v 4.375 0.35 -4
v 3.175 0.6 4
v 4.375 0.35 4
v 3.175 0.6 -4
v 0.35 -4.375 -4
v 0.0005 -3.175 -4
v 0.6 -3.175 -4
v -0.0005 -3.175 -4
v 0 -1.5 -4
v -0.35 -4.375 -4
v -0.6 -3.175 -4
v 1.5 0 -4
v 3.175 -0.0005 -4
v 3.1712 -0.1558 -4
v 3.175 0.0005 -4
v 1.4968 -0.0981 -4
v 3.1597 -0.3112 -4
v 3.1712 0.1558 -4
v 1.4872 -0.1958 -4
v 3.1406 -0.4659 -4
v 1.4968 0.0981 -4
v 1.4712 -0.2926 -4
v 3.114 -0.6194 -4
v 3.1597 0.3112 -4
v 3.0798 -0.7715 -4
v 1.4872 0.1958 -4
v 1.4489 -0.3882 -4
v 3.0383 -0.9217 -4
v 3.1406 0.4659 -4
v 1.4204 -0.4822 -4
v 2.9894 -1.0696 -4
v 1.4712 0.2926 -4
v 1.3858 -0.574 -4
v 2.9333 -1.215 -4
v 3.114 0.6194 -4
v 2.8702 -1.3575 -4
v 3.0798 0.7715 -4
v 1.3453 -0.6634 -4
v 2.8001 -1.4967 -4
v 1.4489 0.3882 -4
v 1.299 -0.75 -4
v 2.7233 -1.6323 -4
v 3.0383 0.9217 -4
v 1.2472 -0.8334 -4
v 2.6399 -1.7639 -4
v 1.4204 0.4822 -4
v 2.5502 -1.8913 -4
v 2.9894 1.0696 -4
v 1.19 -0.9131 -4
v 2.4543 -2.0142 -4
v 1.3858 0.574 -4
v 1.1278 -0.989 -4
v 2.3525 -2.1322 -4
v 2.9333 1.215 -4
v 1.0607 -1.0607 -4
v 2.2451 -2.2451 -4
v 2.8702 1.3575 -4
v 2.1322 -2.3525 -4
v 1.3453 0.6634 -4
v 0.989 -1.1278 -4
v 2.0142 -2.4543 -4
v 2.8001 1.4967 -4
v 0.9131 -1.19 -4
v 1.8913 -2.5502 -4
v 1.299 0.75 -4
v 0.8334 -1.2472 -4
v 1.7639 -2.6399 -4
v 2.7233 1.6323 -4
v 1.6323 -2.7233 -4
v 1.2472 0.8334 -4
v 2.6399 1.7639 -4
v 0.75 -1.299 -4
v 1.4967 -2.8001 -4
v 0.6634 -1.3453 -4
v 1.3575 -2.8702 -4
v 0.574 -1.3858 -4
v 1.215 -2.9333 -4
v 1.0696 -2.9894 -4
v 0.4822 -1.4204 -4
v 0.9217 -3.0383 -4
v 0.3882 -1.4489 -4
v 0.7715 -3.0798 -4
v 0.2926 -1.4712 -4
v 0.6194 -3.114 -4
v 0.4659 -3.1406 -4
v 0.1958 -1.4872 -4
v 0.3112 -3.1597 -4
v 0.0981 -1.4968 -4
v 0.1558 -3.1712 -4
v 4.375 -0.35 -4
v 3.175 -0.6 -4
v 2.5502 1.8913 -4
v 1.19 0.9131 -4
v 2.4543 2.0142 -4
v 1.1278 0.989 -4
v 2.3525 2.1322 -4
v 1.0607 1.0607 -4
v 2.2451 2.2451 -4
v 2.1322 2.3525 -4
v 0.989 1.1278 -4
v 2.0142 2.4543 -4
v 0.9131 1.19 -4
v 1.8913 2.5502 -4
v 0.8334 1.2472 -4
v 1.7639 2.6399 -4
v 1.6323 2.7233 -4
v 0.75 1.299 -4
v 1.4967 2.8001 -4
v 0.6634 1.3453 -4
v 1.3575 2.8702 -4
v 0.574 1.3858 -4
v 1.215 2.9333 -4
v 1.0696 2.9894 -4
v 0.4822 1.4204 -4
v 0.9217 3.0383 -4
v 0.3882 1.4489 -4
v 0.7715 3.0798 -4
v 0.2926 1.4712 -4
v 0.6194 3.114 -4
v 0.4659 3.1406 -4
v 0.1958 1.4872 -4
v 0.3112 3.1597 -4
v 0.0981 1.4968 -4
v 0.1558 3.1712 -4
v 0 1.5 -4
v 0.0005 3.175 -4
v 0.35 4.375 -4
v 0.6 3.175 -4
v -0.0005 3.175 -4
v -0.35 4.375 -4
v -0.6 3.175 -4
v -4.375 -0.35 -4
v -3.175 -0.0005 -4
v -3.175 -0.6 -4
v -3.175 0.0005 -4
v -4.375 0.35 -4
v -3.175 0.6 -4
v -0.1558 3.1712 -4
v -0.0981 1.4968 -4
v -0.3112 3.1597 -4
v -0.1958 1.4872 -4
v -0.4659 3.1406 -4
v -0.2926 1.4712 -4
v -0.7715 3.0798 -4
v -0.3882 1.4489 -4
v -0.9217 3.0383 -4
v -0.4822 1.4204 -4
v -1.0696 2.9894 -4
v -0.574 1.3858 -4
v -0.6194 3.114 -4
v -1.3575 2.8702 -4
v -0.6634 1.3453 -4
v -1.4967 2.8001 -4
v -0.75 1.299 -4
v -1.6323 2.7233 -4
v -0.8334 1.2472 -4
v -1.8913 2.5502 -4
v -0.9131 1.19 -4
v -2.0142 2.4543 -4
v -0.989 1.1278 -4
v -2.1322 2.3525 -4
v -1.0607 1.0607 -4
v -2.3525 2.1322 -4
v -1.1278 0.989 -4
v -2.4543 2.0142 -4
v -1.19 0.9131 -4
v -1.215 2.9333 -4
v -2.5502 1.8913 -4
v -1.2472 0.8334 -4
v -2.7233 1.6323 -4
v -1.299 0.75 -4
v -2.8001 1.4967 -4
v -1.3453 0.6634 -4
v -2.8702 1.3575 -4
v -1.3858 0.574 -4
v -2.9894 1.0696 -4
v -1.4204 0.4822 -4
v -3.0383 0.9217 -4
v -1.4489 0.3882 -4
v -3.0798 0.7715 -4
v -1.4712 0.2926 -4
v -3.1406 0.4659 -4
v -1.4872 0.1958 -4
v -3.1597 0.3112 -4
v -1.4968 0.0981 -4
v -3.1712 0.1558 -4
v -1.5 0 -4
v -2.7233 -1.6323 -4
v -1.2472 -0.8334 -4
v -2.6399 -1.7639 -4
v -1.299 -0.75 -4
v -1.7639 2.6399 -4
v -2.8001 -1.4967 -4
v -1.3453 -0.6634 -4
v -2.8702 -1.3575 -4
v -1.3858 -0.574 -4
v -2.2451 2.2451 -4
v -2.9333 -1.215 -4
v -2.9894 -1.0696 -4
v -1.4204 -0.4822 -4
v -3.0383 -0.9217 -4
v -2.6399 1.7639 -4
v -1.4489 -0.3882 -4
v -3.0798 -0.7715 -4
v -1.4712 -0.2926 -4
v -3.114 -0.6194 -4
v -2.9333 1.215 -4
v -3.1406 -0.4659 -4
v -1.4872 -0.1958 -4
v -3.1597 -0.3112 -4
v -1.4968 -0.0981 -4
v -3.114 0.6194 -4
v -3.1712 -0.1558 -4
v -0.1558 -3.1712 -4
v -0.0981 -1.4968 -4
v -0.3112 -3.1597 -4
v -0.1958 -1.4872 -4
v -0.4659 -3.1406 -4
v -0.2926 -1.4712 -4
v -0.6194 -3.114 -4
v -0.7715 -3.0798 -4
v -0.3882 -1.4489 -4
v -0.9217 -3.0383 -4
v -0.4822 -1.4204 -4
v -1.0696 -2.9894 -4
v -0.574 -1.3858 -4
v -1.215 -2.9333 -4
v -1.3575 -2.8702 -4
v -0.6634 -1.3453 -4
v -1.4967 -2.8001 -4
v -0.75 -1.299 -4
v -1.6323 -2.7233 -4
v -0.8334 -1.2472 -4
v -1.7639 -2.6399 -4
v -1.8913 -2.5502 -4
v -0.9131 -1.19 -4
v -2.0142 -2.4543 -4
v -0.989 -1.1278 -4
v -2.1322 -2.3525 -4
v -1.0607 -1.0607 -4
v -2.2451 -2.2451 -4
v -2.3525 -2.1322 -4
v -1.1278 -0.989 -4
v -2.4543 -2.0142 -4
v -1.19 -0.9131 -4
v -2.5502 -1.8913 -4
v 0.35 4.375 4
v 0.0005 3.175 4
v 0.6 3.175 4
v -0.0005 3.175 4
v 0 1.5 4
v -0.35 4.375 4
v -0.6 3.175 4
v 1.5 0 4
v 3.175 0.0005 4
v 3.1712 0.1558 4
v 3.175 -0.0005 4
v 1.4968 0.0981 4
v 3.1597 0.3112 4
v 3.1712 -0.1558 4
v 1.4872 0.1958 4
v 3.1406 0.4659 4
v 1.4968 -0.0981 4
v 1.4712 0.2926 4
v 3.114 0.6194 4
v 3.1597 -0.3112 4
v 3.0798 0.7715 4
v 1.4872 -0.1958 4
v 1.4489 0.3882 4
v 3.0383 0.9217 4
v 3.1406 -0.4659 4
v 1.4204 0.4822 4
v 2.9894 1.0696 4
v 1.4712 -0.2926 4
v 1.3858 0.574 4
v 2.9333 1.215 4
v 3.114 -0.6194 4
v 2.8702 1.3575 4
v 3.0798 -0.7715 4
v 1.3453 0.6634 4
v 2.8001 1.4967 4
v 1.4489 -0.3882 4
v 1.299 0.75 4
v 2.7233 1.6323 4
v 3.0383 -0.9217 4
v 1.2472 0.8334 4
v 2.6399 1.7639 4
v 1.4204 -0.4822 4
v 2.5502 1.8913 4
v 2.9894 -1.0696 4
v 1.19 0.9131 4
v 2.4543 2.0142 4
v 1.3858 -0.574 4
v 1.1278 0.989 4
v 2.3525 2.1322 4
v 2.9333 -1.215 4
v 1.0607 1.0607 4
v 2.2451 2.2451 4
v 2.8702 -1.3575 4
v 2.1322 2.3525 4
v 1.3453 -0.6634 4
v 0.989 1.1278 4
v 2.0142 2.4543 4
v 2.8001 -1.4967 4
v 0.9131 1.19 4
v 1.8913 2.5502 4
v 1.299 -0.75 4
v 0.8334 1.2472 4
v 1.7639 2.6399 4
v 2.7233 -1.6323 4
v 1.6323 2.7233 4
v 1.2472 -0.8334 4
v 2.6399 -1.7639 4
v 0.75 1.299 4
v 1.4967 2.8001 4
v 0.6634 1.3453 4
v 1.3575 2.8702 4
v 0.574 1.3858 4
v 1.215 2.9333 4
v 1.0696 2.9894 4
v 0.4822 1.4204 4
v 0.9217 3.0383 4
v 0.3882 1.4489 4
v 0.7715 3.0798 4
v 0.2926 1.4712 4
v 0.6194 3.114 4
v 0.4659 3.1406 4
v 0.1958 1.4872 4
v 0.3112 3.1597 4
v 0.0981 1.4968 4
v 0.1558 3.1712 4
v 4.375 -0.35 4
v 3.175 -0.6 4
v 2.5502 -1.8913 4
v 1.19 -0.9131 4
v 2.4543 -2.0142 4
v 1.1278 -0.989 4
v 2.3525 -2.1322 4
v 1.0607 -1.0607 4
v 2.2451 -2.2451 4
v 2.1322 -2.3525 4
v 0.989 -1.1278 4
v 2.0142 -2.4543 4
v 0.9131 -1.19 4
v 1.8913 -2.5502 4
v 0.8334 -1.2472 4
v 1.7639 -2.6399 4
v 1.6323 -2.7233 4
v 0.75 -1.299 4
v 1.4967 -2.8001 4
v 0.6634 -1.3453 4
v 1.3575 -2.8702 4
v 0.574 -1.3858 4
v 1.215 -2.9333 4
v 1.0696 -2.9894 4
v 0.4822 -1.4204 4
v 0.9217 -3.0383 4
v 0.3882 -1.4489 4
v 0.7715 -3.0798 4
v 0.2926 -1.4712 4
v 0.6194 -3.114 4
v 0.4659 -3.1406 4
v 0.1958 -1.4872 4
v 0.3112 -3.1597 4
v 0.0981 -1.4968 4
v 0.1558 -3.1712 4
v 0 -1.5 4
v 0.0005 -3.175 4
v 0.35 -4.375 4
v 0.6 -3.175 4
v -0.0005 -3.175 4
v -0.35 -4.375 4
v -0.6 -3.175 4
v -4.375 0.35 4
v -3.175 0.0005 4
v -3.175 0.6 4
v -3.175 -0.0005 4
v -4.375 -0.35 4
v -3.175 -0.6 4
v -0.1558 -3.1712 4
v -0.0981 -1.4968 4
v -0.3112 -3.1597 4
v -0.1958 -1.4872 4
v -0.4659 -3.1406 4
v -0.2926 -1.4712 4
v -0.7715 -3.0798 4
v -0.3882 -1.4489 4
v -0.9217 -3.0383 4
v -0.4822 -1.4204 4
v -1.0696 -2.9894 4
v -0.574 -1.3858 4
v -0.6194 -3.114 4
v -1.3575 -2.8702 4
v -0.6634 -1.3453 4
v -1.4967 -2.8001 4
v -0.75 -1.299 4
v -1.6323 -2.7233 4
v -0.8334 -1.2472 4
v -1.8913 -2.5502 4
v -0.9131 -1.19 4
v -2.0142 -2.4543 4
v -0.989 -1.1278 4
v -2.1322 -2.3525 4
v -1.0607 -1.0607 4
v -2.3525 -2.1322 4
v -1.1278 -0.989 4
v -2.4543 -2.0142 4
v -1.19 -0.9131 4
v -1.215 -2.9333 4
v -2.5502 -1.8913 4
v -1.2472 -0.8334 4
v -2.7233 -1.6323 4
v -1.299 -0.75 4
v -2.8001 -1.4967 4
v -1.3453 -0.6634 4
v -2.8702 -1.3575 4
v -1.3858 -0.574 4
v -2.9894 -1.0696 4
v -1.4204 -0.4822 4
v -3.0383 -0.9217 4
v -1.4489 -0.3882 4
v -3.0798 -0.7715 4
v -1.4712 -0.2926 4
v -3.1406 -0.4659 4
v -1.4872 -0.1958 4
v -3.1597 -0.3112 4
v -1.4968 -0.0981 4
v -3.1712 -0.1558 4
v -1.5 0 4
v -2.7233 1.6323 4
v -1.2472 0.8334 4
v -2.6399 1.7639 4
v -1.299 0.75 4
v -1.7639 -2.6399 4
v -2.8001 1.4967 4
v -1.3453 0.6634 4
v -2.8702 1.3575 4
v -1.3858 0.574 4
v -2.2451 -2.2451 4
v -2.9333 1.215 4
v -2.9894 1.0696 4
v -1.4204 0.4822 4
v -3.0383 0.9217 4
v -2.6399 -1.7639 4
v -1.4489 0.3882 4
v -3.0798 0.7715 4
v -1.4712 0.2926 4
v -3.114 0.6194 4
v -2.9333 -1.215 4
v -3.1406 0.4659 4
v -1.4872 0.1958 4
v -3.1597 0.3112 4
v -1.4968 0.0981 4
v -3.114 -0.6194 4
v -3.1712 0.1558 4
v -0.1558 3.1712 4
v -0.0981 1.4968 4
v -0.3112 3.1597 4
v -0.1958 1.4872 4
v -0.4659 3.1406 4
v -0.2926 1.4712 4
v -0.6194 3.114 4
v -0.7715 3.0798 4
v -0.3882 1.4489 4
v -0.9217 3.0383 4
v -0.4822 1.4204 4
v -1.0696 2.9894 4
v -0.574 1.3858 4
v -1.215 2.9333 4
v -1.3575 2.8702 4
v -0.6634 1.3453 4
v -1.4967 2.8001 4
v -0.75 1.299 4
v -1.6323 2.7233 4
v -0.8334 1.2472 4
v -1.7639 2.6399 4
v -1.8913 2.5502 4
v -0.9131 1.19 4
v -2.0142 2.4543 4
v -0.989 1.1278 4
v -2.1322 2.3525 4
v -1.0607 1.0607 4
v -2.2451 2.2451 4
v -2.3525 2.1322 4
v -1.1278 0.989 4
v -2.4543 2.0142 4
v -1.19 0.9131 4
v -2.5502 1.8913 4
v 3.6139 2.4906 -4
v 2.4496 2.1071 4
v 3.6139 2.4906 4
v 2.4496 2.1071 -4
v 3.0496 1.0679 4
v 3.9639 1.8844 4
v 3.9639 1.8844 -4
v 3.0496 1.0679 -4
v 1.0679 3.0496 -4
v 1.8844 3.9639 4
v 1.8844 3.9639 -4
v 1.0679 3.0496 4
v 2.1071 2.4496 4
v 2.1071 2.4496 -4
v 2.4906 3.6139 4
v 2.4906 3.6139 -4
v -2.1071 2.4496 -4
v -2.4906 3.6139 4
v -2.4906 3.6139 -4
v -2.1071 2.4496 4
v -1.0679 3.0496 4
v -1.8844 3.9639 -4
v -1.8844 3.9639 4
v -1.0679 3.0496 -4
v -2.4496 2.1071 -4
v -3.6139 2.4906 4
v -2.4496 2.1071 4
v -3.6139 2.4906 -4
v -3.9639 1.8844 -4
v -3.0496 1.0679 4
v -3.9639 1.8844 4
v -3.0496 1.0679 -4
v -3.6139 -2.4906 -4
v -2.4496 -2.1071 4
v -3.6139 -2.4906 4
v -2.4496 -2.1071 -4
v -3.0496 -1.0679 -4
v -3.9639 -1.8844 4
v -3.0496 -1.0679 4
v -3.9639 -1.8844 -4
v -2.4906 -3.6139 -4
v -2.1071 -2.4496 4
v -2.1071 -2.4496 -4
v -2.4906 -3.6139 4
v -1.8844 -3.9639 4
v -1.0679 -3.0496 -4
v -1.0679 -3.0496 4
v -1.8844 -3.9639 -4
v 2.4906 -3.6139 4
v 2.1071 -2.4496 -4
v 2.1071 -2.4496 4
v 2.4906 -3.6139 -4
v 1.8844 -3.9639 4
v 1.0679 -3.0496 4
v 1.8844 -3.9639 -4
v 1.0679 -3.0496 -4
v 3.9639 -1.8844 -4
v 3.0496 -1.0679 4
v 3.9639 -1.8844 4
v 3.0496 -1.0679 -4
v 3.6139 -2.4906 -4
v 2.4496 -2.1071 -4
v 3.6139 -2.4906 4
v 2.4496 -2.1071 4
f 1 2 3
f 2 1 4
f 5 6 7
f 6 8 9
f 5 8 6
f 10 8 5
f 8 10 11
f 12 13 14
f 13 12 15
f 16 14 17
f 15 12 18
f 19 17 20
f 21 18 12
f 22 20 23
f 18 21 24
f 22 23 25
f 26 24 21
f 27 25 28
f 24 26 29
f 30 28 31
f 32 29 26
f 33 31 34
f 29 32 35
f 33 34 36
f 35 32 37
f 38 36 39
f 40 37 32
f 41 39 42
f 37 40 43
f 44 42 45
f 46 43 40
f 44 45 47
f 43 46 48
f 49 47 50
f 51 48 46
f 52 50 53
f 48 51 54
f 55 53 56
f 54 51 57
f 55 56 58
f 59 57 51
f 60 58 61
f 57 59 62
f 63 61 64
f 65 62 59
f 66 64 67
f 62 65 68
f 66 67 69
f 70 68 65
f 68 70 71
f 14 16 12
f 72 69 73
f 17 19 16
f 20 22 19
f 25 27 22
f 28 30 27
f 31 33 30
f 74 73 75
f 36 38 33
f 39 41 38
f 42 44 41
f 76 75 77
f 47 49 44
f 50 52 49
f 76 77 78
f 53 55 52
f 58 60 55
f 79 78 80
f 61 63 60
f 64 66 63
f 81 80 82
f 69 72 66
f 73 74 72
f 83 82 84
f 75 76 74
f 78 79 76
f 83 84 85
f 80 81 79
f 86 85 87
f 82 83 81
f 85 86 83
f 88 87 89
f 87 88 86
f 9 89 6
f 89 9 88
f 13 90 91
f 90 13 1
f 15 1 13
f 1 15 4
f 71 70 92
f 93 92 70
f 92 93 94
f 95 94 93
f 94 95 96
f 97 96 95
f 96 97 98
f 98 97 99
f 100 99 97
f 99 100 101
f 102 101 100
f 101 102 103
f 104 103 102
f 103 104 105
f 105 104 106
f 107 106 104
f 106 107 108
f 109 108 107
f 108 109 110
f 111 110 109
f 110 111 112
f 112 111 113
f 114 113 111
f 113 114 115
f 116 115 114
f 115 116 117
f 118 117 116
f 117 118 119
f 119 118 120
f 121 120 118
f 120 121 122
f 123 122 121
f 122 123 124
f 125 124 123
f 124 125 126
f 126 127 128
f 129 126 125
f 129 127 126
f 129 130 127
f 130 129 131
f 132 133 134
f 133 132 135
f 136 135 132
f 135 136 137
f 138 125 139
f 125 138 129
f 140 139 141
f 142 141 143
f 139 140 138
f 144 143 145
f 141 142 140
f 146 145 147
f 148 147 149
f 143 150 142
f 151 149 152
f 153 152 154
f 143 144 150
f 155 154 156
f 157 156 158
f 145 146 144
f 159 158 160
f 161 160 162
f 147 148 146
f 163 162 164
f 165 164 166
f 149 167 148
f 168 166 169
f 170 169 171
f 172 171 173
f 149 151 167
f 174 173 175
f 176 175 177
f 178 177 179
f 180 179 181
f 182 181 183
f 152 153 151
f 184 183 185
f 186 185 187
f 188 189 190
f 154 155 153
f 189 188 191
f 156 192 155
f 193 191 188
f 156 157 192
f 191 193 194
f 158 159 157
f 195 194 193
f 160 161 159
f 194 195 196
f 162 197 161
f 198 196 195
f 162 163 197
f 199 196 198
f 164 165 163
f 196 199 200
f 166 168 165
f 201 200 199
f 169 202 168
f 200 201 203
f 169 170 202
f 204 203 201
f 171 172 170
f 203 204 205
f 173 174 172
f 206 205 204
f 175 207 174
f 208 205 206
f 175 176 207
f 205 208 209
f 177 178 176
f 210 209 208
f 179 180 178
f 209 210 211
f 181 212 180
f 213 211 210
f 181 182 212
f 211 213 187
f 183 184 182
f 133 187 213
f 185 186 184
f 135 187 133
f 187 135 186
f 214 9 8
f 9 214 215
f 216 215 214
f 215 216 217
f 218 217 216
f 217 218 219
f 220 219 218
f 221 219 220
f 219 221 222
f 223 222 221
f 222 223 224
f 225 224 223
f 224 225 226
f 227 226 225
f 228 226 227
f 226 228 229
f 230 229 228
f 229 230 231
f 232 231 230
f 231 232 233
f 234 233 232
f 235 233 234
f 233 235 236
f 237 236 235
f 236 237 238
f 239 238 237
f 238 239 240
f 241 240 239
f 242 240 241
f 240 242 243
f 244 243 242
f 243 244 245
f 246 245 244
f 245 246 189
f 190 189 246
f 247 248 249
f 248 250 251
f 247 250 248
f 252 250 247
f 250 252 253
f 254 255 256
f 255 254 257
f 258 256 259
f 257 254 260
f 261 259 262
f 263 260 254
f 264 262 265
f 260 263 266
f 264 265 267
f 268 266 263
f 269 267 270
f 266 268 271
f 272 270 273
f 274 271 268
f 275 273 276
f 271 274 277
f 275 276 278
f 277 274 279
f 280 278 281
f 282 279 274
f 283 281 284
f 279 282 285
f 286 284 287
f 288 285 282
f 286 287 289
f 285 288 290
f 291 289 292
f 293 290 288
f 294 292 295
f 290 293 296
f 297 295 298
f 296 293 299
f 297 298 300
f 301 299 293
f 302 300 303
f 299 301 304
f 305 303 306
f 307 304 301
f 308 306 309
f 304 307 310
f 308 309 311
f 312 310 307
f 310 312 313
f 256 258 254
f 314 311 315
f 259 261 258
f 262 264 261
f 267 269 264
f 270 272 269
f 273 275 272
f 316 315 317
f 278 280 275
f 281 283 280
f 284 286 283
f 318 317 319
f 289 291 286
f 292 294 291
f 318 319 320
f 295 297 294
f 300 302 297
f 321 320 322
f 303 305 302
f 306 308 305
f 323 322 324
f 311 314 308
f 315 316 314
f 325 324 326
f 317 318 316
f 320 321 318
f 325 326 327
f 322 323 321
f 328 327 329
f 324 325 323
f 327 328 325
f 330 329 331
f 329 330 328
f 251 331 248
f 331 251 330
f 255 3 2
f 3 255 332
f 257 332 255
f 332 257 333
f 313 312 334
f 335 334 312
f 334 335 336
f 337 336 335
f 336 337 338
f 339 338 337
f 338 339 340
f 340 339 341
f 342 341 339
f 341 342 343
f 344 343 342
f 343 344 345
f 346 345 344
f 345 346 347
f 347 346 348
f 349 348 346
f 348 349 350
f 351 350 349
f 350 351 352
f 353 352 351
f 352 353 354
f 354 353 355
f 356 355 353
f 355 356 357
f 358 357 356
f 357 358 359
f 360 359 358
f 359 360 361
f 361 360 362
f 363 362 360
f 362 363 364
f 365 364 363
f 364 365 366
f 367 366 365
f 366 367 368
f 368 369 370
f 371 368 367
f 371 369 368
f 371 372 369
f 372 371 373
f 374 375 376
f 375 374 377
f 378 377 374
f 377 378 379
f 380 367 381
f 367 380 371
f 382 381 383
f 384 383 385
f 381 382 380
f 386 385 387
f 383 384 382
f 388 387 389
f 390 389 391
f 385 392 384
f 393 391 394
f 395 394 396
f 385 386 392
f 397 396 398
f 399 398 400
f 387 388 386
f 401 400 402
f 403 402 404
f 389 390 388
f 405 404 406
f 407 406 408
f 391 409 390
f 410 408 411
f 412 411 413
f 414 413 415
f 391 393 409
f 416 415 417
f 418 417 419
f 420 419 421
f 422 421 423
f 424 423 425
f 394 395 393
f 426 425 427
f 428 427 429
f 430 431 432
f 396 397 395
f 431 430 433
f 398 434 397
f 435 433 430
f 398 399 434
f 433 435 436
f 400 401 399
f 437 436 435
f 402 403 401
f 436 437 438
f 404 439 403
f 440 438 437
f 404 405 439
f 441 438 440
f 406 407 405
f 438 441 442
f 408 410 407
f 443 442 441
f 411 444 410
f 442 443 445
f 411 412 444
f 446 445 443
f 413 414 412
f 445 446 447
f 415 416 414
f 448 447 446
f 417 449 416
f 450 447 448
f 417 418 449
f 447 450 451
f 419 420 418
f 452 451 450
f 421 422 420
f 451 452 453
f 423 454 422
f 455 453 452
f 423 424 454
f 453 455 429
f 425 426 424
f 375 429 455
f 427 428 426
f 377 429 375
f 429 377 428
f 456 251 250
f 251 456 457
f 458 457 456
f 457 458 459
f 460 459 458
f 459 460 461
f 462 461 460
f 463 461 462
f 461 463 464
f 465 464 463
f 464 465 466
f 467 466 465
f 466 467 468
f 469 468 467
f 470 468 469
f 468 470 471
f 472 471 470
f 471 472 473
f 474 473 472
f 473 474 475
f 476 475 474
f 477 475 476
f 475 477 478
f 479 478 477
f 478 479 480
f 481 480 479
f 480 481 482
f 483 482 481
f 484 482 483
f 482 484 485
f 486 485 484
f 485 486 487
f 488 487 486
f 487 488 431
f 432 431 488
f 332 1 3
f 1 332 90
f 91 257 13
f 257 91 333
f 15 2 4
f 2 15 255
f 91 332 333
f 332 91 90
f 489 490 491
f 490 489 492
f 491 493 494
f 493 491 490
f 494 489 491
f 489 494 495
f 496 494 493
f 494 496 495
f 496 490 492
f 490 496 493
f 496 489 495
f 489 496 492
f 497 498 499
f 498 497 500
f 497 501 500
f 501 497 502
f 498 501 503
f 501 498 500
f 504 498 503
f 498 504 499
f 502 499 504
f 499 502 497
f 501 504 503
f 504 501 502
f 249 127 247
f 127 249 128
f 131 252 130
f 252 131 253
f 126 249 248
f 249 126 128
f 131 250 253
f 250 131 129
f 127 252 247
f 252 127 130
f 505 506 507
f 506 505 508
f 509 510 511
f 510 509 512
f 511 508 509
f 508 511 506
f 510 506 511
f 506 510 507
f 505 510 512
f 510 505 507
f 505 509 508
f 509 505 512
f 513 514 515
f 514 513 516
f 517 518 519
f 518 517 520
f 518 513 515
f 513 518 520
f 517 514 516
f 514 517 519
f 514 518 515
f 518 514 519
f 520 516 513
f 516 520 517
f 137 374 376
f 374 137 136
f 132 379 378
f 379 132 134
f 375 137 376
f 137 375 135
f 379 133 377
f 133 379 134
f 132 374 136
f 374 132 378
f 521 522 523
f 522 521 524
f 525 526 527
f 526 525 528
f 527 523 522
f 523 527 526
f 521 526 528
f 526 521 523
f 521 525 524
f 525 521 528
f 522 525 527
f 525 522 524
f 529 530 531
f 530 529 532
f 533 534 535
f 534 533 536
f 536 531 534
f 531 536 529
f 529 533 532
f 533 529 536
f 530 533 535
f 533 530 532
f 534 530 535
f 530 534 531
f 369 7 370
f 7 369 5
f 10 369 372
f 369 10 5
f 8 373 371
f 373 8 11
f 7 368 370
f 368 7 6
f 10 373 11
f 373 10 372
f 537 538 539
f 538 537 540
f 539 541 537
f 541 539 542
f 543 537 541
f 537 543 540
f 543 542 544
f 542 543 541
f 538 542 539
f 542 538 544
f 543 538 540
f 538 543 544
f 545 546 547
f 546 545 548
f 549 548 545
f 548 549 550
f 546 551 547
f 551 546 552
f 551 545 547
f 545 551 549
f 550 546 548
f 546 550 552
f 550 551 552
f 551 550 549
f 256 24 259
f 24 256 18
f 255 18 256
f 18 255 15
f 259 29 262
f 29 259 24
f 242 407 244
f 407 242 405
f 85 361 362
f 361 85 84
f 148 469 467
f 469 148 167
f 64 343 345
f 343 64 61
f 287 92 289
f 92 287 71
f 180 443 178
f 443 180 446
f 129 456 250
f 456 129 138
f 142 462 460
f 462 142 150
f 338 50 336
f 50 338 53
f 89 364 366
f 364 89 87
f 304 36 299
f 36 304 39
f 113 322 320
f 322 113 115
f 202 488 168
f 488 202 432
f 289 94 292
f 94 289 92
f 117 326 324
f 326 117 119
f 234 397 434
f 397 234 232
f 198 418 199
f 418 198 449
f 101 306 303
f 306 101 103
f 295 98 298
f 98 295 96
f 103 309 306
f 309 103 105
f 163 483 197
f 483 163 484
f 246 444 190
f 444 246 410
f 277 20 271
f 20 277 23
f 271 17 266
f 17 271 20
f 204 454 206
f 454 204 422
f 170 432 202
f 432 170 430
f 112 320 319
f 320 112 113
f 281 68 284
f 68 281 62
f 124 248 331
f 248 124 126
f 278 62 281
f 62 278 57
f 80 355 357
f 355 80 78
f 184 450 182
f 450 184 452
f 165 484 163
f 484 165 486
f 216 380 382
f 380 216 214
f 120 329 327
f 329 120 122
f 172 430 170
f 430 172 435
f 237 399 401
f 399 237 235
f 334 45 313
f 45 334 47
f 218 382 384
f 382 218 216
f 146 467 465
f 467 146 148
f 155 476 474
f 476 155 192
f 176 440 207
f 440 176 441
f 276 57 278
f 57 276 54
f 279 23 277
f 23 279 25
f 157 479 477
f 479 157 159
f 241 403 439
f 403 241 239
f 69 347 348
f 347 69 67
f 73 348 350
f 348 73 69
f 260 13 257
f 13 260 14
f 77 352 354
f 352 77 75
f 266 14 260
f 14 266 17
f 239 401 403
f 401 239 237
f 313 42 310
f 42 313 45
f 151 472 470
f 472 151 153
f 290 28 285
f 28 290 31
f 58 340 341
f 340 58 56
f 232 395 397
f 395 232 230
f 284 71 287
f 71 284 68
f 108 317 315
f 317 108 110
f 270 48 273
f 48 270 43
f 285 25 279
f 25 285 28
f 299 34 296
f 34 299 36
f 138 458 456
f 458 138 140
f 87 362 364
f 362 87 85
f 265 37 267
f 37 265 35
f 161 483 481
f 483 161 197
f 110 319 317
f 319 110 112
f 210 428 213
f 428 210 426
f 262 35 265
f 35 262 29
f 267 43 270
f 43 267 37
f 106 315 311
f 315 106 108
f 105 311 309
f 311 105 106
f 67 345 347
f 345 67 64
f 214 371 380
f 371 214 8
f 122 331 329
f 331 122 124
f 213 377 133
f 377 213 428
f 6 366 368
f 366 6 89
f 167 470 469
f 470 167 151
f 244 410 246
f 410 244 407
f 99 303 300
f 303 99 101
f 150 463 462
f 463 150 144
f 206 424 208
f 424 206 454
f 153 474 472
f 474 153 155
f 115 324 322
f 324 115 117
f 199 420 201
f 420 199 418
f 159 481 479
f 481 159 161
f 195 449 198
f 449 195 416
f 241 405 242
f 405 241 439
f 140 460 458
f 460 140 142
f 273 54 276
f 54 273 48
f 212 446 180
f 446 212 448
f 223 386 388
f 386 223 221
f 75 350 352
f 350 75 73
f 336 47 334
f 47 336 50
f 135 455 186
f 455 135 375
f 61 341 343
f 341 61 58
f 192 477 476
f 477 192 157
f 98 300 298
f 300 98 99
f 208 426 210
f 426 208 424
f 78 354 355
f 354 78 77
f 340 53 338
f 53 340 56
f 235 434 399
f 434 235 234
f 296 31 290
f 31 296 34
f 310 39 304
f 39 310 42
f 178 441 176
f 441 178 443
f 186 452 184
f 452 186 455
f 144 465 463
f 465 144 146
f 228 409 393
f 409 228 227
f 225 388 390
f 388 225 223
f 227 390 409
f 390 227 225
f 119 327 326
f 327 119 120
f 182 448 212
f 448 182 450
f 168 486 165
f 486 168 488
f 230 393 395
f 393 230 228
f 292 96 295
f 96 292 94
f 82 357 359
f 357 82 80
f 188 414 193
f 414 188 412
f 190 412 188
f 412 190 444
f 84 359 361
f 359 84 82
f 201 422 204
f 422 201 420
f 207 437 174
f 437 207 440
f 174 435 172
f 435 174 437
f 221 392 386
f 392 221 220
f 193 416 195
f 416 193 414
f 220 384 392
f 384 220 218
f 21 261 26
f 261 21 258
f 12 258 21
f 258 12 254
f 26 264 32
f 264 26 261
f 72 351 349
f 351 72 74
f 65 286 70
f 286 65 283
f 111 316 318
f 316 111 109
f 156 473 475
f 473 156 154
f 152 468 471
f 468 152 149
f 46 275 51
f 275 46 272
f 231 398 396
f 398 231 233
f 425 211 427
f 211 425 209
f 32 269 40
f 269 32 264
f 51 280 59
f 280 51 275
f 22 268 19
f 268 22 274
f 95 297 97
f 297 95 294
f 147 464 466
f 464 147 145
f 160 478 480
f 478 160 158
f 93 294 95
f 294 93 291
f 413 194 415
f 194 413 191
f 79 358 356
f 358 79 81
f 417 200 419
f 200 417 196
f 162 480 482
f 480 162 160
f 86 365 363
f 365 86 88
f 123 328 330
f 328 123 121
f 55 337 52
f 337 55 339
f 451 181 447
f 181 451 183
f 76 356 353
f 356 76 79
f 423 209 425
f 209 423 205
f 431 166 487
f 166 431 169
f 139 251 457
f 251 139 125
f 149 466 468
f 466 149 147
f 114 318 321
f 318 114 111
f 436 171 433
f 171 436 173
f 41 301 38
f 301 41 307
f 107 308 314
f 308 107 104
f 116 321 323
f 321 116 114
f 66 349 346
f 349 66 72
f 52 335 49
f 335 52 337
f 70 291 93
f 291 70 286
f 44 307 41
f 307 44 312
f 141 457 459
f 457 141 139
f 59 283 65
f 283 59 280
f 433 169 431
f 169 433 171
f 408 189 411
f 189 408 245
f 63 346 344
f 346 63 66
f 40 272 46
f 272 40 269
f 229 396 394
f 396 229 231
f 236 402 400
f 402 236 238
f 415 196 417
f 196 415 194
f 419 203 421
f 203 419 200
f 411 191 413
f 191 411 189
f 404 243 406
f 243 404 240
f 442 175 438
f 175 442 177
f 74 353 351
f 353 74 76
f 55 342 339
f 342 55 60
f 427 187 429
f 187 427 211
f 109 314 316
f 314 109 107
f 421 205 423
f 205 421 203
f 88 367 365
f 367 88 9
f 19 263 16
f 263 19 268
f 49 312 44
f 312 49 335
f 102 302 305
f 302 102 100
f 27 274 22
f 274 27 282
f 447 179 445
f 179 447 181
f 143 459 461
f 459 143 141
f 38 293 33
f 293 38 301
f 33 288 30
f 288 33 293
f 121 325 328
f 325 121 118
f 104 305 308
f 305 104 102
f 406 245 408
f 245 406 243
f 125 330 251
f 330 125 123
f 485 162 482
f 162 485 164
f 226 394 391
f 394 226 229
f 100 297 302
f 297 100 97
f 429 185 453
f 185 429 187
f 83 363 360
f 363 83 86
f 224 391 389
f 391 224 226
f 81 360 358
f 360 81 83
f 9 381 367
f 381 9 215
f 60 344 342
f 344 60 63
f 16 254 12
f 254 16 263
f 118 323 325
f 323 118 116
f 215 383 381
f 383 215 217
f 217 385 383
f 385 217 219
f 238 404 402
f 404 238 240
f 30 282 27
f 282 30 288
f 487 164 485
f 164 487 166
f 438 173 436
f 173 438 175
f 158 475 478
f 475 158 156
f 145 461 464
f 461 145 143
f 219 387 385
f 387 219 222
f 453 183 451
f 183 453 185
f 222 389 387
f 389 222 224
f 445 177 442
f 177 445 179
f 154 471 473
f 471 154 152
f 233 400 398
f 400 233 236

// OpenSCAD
$fn=128;

teeth = 12;
pitch_d = 7.15;          // mm
pitch_r = pitch_d/2;

pulley_h = 8;            // mm
bore_d = 3.0;            // mm

// Approximate tooth geometry (simple trapezoidal teeth)
tooth_radial = 0.8;      // mm outward from pitch radius
tooth_root_inset = 0.4;  // mm inward from pitch radius
tooth_tangential = 1.2;  // mm width at pitch circle (approx)
tooth_top_tangential = 0.7; // mm width at tooth tip (approx)

root_r = max(0.1, pitch_r - tooth_root_inset);
outer_r = pitch_r + tooth_radial;

module tooth_2d() {
    // Trapezoid centered on +X axis, extruded later
    polygon(points=[
        [root_r, -tooth_tangential/2],
        [root_r,  tooth_tangential/2],
        [outer_r,  tooth_top_tangential/2],
        [outer_r, -tooth_top_tangential/2]
    ]);
}

module teeth_ring() {
    for(i=[0:teeth-1]) {
        rotate([0,0, i*360/teeth])
            linear_extrude(height=pulley_h, center=true)
                tooth_2d();
    }
}

module body() {
    cylinder(h=pulley_h, r=root_r, center=true, $fn=128);
}

module pulley() {
    difference() {
        union() {
            body();
            teeth_ring();
        }
        cylinder(h=pulley_h+2, d=bore_d, center=true, $fn=96);
    }
}

pulley();
